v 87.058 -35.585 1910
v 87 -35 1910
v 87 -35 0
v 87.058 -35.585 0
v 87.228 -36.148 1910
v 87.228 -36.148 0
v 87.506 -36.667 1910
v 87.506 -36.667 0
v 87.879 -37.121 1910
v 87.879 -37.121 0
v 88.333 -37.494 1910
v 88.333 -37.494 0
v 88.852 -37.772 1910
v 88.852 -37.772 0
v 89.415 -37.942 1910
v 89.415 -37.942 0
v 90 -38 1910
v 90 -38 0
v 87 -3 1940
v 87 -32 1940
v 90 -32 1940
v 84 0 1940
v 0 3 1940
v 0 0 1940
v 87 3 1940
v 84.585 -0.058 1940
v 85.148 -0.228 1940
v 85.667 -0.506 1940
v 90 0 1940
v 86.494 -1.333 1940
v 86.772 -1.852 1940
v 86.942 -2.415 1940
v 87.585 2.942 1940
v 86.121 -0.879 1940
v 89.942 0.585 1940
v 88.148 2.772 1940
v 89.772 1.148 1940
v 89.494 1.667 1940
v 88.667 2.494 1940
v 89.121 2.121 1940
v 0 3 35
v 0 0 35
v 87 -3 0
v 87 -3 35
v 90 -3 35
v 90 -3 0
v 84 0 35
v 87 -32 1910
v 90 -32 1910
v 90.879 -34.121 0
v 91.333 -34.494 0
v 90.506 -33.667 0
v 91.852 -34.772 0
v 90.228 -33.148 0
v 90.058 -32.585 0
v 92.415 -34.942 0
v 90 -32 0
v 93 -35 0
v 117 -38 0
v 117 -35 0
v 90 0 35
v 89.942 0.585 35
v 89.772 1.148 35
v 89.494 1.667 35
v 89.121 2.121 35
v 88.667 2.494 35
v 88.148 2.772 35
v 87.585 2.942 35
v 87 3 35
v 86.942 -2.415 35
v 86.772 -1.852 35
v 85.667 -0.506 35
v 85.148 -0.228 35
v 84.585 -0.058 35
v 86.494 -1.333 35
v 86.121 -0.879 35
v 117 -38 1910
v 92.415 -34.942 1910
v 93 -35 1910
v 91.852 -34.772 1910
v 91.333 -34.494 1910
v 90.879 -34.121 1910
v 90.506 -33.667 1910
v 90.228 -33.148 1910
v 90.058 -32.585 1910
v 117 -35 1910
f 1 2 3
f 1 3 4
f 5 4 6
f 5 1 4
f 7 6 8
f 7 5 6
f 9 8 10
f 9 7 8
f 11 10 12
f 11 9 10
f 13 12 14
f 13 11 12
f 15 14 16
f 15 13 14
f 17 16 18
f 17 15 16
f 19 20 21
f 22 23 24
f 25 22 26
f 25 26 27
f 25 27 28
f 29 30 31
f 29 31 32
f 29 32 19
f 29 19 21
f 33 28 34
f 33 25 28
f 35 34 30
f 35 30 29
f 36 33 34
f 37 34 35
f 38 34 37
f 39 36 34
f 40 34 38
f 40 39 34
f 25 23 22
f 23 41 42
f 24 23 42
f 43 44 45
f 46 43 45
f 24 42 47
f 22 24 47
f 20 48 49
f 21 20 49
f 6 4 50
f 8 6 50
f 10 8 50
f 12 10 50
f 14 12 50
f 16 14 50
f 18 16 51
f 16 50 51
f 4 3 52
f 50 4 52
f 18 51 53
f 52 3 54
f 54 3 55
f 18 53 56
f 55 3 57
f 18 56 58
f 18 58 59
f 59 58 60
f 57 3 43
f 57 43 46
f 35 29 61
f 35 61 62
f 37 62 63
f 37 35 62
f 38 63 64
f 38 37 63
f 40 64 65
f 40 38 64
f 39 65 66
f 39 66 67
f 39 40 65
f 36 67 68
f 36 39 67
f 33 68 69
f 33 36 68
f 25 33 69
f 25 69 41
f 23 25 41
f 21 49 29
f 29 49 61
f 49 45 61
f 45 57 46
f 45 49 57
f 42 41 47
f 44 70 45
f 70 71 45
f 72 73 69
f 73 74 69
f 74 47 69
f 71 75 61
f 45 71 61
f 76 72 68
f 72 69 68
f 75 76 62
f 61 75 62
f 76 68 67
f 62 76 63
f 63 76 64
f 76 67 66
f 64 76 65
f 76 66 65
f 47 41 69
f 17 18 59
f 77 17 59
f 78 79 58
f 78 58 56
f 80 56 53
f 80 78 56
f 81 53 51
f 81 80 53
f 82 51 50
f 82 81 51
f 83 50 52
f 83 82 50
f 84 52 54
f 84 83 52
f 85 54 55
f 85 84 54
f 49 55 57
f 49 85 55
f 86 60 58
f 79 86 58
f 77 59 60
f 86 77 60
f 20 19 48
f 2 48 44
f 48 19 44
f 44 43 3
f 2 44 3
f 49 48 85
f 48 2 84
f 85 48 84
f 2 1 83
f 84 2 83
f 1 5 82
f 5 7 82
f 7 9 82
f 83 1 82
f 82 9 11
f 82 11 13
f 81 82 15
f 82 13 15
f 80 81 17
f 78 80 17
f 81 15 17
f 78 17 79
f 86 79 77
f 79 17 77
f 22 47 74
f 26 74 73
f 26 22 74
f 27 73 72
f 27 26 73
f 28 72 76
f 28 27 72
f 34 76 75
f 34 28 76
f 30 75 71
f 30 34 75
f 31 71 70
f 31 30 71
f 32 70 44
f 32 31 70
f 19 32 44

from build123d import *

# Parameters (mm, degrees)
BOSS_EXTRUDE1_DEPTH = 1940
FILLET1_R           = 3
SKETCH2_W           = 90
SKETCH2_H           = 35
CUT_EXTRUDE1_DEPTH  = 6
SKETCH3_W           = 30
SKETCH3_H           = 30
CUT_EXTRUDE2_DEPTH  = 6


with BuildPart() as part:
    # Sketch1 → Boss-Extrude1 (new body)
    with BuildSketch(Plane.XY):
        Polygon((0, 0), (87, 0), (87, -38), (117, -38), (117, -35), (90, -35), (90, 3), (0, 3), align=None)
    extrude(amount=BOSS_EXTRUDE1_DEPTH)

    # Fillet1
    fillet1_edges = [part.edges().sort_by_distance(p)[0] for p in [
        (90, 3, 970),
        (90, -35, 970),
        (87, -38, 970),
        (87, 0, 970),
    ]]
    fillet(fillet1_edges, radius=FILLET1_R)

    # Sketch2 → Cut-Extrude1 (cut)
    with BuildSketch(Plane(origin=(0, 3, 0), x_dir=(1, 0, 0), z_dir=(0, 1, 0))):
        with Locations((45, -17.5)):
            Rectangle(SKETCH2_W, SKETCH2_H)
    extrude(amount=-CUT_EXTRUDE1_DEPTH, mode=Mode.SUBTRACT)

    # Sketch3 → Cut-Extrude2 (cut)
    with BuildSketch(Plane.XZ.offset(38)):
        with Locations((102, 1925)):
            Rectangle(SKETCH3_W, SKETCH3_H)
    extrude(amount=-CUT_EXTRUDE2_DEPTH, mode=Mode.SUBTRACT)


solid = part.part
